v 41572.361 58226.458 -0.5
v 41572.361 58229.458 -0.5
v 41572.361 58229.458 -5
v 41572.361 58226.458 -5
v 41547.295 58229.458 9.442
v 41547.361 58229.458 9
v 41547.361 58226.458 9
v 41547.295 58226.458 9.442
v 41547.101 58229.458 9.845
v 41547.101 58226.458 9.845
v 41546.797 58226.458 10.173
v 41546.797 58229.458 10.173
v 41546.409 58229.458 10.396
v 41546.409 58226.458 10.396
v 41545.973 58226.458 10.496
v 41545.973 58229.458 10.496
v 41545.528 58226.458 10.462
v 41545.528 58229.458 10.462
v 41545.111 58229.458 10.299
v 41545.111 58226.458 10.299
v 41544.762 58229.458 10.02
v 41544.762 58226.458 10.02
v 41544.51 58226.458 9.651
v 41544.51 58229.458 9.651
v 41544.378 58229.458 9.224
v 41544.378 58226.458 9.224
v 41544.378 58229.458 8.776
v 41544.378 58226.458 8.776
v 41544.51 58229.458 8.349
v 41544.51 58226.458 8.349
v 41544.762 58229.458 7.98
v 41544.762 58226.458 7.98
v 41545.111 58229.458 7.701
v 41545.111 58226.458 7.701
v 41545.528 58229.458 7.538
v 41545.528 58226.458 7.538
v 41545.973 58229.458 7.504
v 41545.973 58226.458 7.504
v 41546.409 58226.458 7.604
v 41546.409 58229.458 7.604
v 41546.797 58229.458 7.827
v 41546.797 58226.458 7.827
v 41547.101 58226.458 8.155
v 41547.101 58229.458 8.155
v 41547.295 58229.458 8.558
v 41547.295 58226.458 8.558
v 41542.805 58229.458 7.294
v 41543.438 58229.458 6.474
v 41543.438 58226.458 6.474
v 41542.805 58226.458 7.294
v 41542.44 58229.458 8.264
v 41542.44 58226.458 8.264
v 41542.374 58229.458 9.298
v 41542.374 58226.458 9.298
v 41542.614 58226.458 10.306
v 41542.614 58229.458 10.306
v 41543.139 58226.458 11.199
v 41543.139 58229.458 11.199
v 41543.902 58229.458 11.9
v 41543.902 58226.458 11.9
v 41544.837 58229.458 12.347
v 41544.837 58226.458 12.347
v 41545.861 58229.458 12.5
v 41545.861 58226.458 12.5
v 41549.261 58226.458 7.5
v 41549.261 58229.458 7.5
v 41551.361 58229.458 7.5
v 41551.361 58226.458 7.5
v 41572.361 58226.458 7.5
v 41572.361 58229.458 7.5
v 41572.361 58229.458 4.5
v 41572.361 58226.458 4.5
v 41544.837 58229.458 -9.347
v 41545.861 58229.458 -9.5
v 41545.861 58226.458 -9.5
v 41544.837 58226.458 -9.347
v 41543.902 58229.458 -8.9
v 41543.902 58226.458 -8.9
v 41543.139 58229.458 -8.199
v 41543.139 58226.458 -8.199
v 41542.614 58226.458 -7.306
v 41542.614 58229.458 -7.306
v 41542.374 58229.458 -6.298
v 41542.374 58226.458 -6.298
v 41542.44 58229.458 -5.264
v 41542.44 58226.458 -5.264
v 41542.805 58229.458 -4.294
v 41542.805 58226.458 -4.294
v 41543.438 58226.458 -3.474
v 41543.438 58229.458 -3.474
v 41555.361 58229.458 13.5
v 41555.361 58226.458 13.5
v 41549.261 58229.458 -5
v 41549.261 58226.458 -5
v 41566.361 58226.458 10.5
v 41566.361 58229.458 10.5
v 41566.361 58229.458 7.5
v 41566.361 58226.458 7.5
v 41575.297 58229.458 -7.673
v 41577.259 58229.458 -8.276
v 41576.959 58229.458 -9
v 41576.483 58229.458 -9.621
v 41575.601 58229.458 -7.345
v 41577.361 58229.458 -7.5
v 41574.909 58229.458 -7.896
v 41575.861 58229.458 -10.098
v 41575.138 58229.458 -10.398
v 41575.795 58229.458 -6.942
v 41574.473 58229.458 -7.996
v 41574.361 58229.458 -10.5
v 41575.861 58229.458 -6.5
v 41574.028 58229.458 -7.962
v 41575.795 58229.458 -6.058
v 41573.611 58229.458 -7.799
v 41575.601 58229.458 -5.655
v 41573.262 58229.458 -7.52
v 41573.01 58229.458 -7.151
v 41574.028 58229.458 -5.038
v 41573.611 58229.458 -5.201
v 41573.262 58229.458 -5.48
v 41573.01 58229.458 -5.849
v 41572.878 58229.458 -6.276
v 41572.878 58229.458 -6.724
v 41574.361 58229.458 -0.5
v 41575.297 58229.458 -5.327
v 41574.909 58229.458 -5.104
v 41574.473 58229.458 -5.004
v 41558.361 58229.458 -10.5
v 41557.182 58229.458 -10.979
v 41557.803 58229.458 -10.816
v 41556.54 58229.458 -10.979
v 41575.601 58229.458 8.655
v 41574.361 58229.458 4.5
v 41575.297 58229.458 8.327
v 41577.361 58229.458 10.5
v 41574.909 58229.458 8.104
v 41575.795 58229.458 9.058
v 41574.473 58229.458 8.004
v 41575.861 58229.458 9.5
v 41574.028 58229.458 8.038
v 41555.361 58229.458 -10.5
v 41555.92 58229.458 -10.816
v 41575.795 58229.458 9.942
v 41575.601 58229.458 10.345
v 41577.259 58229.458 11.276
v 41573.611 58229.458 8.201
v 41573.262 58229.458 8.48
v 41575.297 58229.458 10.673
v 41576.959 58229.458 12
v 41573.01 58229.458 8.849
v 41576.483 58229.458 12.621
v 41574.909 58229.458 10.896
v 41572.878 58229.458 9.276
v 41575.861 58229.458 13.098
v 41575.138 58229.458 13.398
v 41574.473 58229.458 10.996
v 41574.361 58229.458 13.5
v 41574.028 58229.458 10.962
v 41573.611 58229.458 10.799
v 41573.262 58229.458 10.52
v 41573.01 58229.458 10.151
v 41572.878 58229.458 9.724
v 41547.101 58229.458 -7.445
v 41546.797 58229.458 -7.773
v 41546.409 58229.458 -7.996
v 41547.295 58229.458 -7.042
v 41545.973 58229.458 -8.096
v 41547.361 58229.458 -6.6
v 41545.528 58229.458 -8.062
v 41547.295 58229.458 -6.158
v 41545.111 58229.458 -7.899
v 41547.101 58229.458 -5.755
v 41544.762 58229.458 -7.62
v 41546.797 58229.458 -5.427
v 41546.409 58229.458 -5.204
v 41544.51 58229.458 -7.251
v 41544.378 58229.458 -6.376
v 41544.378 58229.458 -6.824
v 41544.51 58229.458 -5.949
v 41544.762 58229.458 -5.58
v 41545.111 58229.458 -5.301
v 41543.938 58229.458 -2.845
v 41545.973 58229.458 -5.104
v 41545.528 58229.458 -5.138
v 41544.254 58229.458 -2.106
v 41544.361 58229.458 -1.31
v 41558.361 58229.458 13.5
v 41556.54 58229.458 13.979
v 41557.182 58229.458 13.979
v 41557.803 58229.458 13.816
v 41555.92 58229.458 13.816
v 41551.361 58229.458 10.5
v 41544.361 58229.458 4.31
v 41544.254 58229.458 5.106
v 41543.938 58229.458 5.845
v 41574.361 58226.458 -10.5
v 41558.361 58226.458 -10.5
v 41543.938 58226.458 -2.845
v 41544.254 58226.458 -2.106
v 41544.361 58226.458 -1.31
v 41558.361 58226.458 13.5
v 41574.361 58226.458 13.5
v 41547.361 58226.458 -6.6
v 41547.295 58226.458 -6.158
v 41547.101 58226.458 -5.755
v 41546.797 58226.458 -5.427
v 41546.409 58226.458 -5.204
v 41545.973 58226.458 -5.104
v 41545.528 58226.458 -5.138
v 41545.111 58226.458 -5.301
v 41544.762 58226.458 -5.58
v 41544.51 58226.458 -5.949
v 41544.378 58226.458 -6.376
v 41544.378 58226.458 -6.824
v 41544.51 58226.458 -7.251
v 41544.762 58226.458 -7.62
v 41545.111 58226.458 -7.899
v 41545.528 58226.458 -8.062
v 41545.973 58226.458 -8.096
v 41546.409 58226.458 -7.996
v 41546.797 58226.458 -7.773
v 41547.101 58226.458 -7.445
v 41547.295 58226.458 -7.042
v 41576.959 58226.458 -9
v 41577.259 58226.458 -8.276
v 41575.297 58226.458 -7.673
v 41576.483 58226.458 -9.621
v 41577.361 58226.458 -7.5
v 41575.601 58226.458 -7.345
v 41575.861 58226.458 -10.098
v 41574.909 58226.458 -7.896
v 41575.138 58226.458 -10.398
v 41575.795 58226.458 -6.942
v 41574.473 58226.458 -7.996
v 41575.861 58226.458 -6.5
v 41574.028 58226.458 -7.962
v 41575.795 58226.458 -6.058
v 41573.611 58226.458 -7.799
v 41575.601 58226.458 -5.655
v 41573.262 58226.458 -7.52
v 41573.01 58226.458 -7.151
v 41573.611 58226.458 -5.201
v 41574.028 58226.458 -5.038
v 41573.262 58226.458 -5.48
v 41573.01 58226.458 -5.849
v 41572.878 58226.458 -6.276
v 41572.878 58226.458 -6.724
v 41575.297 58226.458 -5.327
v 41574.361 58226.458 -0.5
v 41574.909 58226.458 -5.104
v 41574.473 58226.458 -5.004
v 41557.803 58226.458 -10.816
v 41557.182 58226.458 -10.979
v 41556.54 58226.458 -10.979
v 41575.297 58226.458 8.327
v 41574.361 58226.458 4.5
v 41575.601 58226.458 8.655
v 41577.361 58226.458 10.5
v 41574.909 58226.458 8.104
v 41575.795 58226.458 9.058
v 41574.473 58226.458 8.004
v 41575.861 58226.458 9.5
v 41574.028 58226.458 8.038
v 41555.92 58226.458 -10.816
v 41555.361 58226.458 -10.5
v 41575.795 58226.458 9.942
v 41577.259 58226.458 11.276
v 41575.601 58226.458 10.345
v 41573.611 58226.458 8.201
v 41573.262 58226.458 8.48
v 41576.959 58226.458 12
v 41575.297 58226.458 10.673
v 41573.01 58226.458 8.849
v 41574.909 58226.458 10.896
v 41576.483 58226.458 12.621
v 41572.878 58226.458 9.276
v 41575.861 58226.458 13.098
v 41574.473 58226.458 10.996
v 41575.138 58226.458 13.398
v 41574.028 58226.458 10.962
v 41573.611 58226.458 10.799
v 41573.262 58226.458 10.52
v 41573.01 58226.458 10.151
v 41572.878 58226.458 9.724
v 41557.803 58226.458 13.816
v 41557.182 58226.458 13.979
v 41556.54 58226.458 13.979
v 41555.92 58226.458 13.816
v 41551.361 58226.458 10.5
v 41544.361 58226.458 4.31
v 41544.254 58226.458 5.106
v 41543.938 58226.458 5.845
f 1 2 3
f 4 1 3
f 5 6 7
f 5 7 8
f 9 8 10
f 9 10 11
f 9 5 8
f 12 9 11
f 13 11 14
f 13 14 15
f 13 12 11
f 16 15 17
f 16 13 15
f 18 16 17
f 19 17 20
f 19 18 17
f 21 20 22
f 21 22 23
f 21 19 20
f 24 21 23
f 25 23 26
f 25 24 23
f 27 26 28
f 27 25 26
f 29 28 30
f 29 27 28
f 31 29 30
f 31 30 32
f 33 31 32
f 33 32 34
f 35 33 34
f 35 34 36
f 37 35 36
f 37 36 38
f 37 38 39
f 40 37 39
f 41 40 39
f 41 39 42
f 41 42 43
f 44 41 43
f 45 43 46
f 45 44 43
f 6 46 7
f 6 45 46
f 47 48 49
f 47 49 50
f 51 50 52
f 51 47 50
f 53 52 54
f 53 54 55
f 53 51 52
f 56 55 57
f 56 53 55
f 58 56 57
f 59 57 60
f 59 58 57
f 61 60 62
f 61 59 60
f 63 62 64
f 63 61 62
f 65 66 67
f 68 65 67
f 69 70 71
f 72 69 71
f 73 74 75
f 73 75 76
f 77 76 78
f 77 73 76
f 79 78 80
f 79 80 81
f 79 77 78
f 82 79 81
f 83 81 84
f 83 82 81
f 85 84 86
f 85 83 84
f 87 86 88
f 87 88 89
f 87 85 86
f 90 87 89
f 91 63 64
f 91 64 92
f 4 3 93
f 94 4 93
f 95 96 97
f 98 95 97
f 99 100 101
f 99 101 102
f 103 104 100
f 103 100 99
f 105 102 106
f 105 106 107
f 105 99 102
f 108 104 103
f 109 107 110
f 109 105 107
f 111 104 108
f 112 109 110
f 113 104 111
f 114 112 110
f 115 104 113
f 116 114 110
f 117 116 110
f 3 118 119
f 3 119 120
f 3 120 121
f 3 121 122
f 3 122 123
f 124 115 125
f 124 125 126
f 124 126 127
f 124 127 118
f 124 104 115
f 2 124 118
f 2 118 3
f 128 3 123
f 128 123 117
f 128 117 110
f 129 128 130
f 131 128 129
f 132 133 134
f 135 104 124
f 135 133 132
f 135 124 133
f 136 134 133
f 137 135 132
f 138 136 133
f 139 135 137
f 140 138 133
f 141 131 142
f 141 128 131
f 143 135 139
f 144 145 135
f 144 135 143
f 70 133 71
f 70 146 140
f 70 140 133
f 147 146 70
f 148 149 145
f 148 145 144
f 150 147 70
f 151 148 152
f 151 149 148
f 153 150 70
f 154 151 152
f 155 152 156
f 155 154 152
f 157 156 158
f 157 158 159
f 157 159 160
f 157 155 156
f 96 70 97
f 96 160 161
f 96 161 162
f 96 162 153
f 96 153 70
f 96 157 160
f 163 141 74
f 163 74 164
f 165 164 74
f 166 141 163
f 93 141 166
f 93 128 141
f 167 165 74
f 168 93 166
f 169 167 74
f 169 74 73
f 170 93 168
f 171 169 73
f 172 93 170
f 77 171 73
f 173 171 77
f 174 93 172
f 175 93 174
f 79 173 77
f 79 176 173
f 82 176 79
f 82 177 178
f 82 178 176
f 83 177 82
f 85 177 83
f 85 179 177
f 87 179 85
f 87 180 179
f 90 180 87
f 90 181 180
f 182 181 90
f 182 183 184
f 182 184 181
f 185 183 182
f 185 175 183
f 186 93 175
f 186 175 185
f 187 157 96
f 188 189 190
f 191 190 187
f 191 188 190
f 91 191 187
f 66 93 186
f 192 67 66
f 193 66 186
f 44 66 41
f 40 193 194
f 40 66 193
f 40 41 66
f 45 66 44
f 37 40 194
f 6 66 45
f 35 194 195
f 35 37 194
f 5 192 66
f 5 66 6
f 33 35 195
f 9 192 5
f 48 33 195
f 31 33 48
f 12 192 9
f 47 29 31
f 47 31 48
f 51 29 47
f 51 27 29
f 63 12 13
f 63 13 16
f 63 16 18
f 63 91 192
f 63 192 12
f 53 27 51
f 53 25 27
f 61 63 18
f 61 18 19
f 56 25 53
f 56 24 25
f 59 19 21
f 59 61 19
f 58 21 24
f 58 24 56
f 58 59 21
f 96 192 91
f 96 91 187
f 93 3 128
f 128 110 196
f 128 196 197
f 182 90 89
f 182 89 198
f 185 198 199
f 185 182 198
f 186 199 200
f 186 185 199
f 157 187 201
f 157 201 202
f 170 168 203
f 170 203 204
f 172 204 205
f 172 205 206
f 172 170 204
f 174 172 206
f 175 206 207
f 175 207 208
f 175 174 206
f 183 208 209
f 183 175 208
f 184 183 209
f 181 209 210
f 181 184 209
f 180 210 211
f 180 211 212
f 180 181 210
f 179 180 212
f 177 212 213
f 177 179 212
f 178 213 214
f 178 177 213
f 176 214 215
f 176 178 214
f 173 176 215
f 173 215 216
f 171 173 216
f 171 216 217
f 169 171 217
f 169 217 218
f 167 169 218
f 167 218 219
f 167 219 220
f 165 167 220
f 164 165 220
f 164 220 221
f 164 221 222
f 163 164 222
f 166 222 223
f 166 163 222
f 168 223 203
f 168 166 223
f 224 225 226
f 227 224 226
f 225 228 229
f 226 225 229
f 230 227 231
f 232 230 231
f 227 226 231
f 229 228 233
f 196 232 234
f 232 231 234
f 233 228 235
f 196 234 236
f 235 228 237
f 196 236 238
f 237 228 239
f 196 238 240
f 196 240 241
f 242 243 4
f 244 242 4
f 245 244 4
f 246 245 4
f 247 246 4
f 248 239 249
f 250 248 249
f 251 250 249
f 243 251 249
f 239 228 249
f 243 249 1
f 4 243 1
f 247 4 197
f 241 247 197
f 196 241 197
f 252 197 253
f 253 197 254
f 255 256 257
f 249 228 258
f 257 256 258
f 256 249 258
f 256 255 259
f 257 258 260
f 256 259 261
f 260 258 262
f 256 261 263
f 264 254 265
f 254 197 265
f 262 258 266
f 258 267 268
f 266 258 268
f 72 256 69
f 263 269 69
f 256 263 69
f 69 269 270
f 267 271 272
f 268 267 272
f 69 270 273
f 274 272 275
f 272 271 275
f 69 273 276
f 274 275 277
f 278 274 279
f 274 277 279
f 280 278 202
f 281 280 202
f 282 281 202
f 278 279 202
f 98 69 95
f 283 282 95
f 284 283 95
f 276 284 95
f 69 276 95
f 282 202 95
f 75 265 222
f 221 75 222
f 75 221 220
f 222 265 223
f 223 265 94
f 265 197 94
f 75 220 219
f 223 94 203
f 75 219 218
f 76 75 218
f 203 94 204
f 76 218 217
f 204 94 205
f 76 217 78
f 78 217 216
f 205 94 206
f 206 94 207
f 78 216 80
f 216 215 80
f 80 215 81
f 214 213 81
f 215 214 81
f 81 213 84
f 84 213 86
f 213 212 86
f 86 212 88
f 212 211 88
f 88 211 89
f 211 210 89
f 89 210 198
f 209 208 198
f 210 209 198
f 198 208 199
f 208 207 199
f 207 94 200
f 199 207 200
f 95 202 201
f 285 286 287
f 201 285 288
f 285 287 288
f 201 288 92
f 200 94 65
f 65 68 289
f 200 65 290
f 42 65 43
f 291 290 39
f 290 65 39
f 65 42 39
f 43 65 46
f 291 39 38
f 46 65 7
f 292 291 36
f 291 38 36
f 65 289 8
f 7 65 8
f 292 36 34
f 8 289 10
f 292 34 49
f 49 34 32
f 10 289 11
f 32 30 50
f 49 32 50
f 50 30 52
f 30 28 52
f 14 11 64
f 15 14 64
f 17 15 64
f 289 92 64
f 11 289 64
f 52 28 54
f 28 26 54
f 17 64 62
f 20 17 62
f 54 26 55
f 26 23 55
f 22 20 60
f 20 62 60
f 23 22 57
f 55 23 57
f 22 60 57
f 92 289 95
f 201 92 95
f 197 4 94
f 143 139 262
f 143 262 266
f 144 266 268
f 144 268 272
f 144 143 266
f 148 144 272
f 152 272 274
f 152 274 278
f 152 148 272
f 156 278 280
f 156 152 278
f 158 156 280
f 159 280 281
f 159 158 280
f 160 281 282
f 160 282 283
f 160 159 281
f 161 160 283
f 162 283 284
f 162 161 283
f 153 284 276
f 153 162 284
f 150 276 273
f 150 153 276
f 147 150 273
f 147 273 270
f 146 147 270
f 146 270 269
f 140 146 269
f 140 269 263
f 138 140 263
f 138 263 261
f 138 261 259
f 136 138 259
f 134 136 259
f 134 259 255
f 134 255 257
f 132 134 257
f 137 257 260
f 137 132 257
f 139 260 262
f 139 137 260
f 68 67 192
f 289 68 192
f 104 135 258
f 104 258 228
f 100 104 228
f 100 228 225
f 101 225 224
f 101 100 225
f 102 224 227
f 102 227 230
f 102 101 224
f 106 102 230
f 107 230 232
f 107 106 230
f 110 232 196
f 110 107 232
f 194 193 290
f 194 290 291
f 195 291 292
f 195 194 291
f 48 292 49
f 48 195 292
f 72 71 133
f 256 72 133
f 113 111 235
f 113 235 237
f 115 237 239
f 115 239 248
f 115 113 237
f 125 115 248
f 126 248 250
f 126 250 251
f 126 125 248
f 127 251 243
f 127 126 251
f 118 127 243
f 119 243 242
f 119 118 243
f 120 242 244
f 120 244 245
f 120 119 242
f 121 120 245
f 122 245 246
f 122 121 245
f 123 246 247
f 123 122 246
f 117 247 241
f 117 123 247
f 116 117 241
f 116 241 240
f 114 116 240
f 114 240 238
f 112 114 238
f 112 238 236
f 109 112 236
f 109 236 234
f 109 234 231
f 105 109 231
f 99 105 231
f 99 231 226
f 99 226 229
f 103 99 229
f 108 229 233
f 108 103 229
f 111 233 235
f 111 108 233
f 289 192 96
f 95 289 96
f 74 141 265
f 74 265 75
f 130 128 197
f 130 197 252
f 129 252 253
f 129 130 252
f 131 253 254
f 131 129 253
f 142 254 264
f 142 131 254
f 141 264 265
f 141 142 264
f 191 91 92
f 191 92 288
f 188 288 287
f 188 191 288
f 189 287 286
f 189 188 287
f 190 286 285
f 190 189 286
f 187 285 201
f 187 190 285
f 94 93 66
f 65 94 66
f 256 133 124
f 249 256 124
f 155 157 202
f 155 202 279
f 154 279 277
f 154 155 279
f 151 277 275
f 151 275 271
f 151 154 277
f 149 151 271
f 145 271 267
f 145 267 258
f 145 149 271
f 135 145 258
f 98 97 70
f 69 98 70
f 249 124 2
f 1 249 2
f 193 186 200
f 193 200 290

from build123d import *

# Parameters (mm, degrees)
CROQUIS1_R                 = 1.5
SALIENTE_EXTRUIR1_DEPTH    = 3
S_LIDO_MOVER_COPIAR1_ANGLE = 90


with BuildPart() as part:
    # Croquis1 → Saliente-Extruir1 (new body)
    with BuildSketch(Plane.XY):
        with BuildLine():
            Line((41558.361281649, 58239.957618209), (41574.361281649, 58239.957618209))
            ThreePointArc((41574.361281649, 58239.957618209), (41576.482601992, 58239.078938552), (41577.361281649, 58236.957618209))
            Line((41577.361281649, 58236.957618209), (41577.361281649, 58218.957618209))
            ThreePointArc((41577.361281649, 58218.957618209), (41576.482601992, 58216.836297865), (41574.361281649, 58215.957618209))
            Line((41574.361281649, 58215.957618209), (41558.361281649, 58215.957618209))
            ThreePointArc((41558.361281649, 58215.957618209), (41556.861281649, 58215.457618209), (41555.361281649, 58215.957618209))
            Line((41555.361281649, 58215.957618209), (41545.861281649, 58216.957618209))
            ThreePointArc((41545.861281649, 58216.957618209), (41542.614003581, 58219.151790828), (41543.438204726, 58222.983226695))
            ThreePointArc((41543.438204726, 58222.983226695), (41544.120880282, 58223.971337158), (41544.361281649, 58225.148033968))
            Line((41544.361281649, 58225.148033968), (41544.361281649, 58230.767202449))
            ThreePointArc((41544.361281649, 58230.767202449), (41544.120880282, 58231.94389926), (41543.438204726, 58232.932009723))
            ThreePointArc((41543.438204726, 58232.932009723), (41542.614003581, 58236.76344559), (41545.86128165, 58238.957618209))
            Line((41545.86128165, 58238.957618209), (41555.361281649, 58239.957618209))
            ThreePointArc((41555.361281649, 58239.957618209), (41556.861281649, 58240.457618209), (41558.361281649, 58239.957618209))
        make_face()
        with Locations((41545.861281649, 58235.457618209)):
            Circle(CROQUIS1_R, mode=Mode.SUBTRACT)
        with Locations((41545.861281649, 58219.857618209)):
            Circle(CROQUIS1_R, mode=Mode.SUBTRACT)
        with Locations((41574.361281649, 58219.957618209)):
            Circle(CROQUIS1_R, mode=Mode.SUBTRACT)
        with Locations((41574.361281649, 58235.957618209)):
            Circle(CROQUIS1_R, mode=Mode.SUBTRACT)
        Polygon((41551.361281649, 58236.957618209), (41566.361281649, 58236.957618209), (41566.361281649, 58233.957618209), (41572.361281649, 58233.957618209), (41572.361281649, 58230.957618209), (41574.361281649, 58230.957618209), (41574.361281649, 58225.957618209), (41572.361281649, 58225.957618209), (41572.361281649, 58221.457618208), (41549.261281649, 58221.457618208), (41549.261281649, 58233.957618209), (41551.361281649, 58233.957618209), align=None, mode=Mode.SUBTRACT)
    extrude(amount=SALIENTE_EXTRUIR1_DEPTH)


with BuildPart() as part_1:
    # Sólido-Mover/Copiar1: moved
    add(part.part.rotate(Axis((0, 58227.957618209, 1.5), (1, 0, 0)), S_LIDO_MOVER_COPIAR1_ANGLE))


solid = part_1.part
